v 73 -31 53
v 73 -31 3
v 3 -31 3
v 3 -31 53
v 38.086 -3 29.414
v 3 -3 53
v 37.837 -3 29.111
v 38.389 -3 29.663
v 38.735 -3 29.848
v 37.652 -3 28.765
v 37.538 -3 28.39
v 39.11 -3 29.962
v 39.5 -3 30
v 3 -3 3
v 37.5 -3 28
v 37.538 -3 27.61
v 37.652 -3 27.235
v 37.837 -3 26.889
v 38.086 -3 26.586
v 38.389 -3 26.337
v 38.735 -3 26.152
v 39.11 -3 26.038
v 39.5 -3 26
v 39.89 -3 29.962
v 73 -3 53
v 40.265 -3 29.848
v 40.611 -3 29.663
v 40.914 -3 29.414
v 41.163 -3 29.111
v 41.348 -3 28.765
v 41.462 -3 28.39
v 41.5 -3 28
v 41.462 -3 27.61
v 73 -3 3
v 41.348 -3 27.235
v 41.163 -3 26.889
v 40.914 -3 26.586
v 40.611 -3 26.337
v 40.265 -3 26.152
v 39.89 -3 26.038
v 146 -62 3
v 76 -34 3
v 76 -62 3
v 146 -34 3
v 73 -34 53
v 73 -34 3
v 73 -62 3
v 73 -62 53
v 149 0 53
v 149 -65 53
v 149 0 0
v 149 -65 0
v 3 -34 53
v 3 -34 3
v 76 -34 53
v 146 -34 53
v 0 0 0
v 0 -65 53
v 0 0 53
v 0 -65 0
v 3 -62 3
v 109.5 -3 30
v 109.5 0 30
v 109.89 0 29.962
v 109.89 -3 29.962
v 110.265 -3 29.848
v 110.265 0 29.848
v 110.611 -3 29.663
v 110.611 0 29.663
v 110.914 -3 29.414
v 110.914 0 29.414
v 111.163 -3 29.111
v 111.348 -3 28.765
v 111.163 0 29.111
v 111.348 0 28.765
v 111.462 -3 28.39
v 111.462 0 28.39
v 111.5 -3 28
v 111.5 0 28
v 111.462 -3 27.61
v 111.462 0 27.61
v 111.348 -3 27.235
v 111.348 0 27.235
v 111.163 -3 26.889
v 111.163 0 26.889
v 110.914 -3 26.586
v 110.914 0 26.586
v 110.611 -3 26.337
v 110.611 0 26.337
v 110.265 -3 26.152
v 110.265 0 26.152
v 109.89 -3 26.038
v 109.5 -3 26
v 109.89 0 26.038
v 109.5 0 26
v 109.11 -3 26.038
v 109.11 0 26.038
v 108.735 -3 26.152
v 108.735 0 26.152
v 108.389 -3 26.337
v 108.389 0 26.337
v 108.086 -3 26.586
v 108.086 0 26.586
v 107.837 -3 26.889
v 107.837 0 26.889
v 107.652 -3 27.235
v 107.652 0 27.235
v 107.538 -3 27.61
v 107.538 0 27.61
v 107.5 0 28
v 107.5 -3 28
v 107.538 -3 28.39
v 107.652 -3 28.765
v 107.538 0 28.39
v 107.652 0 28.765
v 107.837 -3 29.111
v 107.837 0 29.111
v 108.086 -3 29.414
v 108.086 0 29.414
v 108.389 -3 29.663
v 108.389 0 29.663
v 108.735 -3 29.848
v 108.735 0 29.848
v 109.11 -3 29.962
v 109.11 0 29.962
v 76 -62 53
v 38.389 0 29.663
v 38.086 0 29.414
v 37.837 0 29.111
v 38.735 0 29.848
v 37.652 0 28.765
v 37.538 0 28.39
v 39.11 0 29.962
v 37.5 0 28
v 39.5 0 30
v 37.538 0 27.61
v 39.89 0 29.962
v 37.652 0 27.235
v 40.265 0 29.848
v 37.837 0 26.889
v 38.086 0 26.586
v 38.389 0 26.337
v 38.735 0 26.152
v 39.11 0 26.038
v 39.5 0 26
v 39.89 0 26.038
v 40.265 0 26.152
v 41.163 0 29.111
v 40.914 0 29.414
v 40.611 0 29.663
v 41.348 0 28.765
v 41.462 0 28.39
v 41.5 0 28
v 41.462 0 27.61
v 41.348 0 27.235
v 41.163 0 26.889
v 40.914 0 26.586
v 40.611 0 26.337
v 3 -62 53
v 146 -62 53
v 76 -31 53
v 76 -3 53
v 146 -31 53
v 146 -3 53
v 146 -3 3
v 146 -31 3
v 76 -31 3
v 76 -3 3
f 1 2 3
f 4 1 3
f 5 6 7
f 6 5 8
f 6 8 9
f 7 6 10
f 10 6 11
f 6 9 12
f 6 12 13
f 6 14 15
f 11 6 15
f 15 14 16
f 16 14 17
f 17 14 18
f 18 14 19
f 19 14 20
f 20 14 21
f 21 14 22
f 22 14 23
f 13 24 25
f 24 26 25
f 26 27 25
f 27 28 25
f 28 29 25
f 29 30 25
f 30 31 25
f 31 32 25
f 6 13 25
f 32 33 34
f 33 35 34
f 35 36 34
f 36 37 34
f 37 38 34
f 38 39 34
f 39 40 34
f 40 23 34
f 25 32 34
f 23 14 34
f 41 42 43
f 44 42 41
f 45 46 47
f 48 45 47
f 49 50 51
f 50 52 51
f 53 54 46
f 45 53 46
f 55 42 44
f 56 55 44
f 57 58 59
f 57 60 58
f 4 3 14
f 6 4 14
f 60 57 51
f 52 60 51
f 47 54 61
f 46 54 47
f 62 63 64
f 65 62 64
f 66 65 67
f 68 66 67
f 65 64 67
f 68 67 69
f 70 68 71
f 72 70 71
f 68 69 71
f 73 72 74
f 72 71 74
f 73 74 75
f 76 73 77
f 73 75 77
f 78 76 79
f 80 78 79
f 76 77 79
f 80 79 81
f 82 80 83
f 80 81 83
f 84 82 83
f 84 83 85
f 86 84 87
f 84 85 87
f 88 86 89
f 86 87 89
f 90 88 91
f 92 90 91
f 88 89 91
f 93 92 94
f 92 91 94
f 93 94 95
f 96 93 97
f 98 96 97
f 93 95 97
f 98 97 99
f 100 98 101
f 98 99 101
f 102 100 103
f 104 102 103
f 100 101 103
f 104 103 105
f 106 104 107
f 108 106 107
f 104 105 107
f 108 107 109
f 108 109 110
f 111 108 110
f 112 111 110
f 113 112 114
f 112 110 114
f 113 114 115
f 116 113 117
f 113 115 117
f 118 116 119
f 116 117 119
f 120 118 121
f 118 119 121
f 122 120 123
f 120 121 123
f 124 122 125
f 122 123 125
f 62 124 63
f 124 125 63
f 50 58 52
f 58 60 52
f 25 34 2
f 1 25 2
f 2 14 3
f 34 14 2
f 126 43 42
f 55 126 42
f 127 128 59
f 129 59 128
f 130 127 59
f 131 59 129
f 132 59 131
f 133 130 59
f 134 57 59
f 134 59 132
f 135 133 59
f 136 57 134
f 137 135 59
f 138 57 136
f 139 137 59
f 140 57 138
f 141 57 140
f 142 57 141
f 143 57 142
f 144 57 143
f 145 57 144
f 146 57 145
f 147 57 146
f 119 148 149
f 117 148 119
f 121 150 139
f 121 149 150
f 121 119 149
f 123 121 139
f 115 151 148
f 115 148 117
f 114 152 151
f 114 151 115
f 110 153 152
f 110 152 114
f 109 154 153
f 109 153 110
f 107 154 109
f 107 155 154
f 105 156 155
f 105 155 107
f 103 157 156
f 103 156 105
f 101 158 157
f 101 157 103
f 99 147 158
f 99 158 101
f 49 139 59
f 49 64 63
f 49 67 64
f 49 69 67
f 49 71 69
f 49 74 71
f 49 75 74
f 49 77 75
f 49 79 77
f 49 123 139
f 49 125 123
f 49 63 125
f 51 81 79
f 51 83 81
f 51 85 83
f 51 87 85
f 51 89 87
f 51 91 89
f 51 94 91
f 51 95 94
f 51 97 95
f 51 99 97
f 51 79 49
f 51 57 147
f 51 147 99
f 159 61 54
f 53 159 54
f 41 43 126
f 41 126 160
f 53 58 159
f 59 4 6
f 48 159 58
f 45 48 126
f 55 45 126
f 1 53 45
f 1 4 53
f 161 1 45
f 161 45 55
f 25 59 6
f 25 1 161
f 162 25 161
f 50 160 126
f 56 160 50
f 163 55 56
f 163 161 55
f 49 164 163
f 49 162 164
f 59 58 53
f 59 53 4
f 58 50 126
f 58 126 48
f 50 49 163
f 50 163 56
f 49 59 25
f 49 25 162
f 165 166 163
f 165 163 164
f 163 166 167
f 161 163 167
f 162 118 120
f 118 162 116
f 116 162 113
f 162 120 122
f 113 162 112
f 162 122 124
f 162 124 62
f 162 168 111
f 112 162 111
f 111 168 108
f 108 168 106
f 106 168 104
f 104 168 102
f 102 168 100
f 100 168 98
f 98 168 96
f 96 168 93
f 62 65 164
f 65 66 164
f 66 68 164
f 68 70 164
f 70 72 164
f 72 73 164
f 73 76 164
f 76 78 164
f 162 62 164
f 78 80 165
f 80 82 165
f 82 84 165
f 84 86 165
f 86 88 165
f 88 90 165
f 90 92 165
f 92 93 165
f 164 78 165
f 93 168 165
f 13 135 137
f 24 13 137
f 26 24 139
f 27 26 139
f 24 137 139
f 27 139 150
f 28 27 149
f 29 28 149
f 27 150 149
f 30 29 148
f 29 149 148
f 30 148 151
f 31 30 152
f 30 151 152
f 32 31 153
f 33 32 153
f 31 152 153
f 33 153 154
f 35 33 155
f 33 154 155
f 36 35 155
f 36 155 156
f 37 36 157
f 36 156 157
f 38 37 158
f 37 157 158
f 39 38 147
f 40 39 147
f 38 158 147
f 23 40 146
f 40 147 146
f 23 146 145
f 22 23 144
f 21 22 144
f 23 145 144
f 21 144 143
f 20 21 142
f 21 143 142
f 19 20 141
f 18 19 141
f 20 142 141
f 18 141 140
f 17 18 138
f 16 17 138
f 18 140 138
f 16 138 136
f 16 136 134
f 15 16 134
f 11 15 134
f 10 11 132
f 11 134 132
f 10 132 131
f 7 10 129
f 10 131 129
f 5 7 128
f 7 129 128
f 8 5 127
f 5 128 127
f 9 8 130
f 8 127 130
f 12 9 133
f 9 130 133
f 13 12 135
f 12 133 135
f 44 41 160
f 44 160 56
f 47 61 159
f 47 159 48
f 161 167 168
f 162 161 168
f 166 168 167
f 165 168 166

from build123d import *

# Parameters (mm, degrees)
SKETCH1_W           = 149
SKETCH1_H           = 65
BOSS_EXTRUDE1_DEPTH = 3
SKETCH2_W           = 149
SKETCH2_H           = 65
SKETCH2_W_2         = 143
SKETCH2_H_2         = 59
BOSS_EXTRUDE2_DEPTH = 50
BOSS_EXTRUDE3_DEPTH = 50
SKETCH5_R           = 2
CUT_EXTRUDE1_DEPTH  = 3


with BuildPart() as part:
    # Sketch1 → Boss-Extrude1 (new body)
    with BuildSketch(Plane.XY):
        with Locations((74.5, -32.5)):
            Rectangle(SKETCH1_W, SKETCH1_H)
    extrude(amount=BOSS_EXTRUDE1_DEPTH)

    # Sketch2 → Boss-Extrude2 (add)
    with BuildSketch(Plane.XY.offset(3)):
        with Locations((74.5, -32.5)):
            Rectangle(SKETCH2_W, SKETCH2_H)
        with Locations((74.5, -32.5)):
            Rectangle(SKETCH2_W_2, SKETCH2_H_2, mode=Mode.SUBTRACT)
    extrude(amount=BOSS_EXTRUDE2_DEPTH)

    # Sketch4 → Boss-Extrude3 (add)
    with BuildSketch(Plane.XY.offset(3)):
        Polygon((73, -3), (73, -31), (3, -31), (3, -34), (73, -34), (73, -62), (76, -62), (76, -34), (146, -34), (146, -31), (76, -31), (76, -3), align=None)
    extrude(amount=BOSS_EXTRUDE3_DEPTH)

    # Sketch5 → Cut-Extrude1 (cut)
    with BuildSketch(Plane(origin=(0, 0, 0), x_dir=(1, 0, 0), z_dir=(0, 1, 0))):
        with Locations(Location((39.5, -28, 0), (0, 0, 270))):
            Circle(SKETCH5_R)
        with Locations(Location((109.5, -28, 0), (0, 0, 270))):
            Circle(SKETCH5_R)
    extrude(amount=-CUT_EXTRUDE1_DEPTH, mode=Mode.SUBTRACT)


solid = part.part
